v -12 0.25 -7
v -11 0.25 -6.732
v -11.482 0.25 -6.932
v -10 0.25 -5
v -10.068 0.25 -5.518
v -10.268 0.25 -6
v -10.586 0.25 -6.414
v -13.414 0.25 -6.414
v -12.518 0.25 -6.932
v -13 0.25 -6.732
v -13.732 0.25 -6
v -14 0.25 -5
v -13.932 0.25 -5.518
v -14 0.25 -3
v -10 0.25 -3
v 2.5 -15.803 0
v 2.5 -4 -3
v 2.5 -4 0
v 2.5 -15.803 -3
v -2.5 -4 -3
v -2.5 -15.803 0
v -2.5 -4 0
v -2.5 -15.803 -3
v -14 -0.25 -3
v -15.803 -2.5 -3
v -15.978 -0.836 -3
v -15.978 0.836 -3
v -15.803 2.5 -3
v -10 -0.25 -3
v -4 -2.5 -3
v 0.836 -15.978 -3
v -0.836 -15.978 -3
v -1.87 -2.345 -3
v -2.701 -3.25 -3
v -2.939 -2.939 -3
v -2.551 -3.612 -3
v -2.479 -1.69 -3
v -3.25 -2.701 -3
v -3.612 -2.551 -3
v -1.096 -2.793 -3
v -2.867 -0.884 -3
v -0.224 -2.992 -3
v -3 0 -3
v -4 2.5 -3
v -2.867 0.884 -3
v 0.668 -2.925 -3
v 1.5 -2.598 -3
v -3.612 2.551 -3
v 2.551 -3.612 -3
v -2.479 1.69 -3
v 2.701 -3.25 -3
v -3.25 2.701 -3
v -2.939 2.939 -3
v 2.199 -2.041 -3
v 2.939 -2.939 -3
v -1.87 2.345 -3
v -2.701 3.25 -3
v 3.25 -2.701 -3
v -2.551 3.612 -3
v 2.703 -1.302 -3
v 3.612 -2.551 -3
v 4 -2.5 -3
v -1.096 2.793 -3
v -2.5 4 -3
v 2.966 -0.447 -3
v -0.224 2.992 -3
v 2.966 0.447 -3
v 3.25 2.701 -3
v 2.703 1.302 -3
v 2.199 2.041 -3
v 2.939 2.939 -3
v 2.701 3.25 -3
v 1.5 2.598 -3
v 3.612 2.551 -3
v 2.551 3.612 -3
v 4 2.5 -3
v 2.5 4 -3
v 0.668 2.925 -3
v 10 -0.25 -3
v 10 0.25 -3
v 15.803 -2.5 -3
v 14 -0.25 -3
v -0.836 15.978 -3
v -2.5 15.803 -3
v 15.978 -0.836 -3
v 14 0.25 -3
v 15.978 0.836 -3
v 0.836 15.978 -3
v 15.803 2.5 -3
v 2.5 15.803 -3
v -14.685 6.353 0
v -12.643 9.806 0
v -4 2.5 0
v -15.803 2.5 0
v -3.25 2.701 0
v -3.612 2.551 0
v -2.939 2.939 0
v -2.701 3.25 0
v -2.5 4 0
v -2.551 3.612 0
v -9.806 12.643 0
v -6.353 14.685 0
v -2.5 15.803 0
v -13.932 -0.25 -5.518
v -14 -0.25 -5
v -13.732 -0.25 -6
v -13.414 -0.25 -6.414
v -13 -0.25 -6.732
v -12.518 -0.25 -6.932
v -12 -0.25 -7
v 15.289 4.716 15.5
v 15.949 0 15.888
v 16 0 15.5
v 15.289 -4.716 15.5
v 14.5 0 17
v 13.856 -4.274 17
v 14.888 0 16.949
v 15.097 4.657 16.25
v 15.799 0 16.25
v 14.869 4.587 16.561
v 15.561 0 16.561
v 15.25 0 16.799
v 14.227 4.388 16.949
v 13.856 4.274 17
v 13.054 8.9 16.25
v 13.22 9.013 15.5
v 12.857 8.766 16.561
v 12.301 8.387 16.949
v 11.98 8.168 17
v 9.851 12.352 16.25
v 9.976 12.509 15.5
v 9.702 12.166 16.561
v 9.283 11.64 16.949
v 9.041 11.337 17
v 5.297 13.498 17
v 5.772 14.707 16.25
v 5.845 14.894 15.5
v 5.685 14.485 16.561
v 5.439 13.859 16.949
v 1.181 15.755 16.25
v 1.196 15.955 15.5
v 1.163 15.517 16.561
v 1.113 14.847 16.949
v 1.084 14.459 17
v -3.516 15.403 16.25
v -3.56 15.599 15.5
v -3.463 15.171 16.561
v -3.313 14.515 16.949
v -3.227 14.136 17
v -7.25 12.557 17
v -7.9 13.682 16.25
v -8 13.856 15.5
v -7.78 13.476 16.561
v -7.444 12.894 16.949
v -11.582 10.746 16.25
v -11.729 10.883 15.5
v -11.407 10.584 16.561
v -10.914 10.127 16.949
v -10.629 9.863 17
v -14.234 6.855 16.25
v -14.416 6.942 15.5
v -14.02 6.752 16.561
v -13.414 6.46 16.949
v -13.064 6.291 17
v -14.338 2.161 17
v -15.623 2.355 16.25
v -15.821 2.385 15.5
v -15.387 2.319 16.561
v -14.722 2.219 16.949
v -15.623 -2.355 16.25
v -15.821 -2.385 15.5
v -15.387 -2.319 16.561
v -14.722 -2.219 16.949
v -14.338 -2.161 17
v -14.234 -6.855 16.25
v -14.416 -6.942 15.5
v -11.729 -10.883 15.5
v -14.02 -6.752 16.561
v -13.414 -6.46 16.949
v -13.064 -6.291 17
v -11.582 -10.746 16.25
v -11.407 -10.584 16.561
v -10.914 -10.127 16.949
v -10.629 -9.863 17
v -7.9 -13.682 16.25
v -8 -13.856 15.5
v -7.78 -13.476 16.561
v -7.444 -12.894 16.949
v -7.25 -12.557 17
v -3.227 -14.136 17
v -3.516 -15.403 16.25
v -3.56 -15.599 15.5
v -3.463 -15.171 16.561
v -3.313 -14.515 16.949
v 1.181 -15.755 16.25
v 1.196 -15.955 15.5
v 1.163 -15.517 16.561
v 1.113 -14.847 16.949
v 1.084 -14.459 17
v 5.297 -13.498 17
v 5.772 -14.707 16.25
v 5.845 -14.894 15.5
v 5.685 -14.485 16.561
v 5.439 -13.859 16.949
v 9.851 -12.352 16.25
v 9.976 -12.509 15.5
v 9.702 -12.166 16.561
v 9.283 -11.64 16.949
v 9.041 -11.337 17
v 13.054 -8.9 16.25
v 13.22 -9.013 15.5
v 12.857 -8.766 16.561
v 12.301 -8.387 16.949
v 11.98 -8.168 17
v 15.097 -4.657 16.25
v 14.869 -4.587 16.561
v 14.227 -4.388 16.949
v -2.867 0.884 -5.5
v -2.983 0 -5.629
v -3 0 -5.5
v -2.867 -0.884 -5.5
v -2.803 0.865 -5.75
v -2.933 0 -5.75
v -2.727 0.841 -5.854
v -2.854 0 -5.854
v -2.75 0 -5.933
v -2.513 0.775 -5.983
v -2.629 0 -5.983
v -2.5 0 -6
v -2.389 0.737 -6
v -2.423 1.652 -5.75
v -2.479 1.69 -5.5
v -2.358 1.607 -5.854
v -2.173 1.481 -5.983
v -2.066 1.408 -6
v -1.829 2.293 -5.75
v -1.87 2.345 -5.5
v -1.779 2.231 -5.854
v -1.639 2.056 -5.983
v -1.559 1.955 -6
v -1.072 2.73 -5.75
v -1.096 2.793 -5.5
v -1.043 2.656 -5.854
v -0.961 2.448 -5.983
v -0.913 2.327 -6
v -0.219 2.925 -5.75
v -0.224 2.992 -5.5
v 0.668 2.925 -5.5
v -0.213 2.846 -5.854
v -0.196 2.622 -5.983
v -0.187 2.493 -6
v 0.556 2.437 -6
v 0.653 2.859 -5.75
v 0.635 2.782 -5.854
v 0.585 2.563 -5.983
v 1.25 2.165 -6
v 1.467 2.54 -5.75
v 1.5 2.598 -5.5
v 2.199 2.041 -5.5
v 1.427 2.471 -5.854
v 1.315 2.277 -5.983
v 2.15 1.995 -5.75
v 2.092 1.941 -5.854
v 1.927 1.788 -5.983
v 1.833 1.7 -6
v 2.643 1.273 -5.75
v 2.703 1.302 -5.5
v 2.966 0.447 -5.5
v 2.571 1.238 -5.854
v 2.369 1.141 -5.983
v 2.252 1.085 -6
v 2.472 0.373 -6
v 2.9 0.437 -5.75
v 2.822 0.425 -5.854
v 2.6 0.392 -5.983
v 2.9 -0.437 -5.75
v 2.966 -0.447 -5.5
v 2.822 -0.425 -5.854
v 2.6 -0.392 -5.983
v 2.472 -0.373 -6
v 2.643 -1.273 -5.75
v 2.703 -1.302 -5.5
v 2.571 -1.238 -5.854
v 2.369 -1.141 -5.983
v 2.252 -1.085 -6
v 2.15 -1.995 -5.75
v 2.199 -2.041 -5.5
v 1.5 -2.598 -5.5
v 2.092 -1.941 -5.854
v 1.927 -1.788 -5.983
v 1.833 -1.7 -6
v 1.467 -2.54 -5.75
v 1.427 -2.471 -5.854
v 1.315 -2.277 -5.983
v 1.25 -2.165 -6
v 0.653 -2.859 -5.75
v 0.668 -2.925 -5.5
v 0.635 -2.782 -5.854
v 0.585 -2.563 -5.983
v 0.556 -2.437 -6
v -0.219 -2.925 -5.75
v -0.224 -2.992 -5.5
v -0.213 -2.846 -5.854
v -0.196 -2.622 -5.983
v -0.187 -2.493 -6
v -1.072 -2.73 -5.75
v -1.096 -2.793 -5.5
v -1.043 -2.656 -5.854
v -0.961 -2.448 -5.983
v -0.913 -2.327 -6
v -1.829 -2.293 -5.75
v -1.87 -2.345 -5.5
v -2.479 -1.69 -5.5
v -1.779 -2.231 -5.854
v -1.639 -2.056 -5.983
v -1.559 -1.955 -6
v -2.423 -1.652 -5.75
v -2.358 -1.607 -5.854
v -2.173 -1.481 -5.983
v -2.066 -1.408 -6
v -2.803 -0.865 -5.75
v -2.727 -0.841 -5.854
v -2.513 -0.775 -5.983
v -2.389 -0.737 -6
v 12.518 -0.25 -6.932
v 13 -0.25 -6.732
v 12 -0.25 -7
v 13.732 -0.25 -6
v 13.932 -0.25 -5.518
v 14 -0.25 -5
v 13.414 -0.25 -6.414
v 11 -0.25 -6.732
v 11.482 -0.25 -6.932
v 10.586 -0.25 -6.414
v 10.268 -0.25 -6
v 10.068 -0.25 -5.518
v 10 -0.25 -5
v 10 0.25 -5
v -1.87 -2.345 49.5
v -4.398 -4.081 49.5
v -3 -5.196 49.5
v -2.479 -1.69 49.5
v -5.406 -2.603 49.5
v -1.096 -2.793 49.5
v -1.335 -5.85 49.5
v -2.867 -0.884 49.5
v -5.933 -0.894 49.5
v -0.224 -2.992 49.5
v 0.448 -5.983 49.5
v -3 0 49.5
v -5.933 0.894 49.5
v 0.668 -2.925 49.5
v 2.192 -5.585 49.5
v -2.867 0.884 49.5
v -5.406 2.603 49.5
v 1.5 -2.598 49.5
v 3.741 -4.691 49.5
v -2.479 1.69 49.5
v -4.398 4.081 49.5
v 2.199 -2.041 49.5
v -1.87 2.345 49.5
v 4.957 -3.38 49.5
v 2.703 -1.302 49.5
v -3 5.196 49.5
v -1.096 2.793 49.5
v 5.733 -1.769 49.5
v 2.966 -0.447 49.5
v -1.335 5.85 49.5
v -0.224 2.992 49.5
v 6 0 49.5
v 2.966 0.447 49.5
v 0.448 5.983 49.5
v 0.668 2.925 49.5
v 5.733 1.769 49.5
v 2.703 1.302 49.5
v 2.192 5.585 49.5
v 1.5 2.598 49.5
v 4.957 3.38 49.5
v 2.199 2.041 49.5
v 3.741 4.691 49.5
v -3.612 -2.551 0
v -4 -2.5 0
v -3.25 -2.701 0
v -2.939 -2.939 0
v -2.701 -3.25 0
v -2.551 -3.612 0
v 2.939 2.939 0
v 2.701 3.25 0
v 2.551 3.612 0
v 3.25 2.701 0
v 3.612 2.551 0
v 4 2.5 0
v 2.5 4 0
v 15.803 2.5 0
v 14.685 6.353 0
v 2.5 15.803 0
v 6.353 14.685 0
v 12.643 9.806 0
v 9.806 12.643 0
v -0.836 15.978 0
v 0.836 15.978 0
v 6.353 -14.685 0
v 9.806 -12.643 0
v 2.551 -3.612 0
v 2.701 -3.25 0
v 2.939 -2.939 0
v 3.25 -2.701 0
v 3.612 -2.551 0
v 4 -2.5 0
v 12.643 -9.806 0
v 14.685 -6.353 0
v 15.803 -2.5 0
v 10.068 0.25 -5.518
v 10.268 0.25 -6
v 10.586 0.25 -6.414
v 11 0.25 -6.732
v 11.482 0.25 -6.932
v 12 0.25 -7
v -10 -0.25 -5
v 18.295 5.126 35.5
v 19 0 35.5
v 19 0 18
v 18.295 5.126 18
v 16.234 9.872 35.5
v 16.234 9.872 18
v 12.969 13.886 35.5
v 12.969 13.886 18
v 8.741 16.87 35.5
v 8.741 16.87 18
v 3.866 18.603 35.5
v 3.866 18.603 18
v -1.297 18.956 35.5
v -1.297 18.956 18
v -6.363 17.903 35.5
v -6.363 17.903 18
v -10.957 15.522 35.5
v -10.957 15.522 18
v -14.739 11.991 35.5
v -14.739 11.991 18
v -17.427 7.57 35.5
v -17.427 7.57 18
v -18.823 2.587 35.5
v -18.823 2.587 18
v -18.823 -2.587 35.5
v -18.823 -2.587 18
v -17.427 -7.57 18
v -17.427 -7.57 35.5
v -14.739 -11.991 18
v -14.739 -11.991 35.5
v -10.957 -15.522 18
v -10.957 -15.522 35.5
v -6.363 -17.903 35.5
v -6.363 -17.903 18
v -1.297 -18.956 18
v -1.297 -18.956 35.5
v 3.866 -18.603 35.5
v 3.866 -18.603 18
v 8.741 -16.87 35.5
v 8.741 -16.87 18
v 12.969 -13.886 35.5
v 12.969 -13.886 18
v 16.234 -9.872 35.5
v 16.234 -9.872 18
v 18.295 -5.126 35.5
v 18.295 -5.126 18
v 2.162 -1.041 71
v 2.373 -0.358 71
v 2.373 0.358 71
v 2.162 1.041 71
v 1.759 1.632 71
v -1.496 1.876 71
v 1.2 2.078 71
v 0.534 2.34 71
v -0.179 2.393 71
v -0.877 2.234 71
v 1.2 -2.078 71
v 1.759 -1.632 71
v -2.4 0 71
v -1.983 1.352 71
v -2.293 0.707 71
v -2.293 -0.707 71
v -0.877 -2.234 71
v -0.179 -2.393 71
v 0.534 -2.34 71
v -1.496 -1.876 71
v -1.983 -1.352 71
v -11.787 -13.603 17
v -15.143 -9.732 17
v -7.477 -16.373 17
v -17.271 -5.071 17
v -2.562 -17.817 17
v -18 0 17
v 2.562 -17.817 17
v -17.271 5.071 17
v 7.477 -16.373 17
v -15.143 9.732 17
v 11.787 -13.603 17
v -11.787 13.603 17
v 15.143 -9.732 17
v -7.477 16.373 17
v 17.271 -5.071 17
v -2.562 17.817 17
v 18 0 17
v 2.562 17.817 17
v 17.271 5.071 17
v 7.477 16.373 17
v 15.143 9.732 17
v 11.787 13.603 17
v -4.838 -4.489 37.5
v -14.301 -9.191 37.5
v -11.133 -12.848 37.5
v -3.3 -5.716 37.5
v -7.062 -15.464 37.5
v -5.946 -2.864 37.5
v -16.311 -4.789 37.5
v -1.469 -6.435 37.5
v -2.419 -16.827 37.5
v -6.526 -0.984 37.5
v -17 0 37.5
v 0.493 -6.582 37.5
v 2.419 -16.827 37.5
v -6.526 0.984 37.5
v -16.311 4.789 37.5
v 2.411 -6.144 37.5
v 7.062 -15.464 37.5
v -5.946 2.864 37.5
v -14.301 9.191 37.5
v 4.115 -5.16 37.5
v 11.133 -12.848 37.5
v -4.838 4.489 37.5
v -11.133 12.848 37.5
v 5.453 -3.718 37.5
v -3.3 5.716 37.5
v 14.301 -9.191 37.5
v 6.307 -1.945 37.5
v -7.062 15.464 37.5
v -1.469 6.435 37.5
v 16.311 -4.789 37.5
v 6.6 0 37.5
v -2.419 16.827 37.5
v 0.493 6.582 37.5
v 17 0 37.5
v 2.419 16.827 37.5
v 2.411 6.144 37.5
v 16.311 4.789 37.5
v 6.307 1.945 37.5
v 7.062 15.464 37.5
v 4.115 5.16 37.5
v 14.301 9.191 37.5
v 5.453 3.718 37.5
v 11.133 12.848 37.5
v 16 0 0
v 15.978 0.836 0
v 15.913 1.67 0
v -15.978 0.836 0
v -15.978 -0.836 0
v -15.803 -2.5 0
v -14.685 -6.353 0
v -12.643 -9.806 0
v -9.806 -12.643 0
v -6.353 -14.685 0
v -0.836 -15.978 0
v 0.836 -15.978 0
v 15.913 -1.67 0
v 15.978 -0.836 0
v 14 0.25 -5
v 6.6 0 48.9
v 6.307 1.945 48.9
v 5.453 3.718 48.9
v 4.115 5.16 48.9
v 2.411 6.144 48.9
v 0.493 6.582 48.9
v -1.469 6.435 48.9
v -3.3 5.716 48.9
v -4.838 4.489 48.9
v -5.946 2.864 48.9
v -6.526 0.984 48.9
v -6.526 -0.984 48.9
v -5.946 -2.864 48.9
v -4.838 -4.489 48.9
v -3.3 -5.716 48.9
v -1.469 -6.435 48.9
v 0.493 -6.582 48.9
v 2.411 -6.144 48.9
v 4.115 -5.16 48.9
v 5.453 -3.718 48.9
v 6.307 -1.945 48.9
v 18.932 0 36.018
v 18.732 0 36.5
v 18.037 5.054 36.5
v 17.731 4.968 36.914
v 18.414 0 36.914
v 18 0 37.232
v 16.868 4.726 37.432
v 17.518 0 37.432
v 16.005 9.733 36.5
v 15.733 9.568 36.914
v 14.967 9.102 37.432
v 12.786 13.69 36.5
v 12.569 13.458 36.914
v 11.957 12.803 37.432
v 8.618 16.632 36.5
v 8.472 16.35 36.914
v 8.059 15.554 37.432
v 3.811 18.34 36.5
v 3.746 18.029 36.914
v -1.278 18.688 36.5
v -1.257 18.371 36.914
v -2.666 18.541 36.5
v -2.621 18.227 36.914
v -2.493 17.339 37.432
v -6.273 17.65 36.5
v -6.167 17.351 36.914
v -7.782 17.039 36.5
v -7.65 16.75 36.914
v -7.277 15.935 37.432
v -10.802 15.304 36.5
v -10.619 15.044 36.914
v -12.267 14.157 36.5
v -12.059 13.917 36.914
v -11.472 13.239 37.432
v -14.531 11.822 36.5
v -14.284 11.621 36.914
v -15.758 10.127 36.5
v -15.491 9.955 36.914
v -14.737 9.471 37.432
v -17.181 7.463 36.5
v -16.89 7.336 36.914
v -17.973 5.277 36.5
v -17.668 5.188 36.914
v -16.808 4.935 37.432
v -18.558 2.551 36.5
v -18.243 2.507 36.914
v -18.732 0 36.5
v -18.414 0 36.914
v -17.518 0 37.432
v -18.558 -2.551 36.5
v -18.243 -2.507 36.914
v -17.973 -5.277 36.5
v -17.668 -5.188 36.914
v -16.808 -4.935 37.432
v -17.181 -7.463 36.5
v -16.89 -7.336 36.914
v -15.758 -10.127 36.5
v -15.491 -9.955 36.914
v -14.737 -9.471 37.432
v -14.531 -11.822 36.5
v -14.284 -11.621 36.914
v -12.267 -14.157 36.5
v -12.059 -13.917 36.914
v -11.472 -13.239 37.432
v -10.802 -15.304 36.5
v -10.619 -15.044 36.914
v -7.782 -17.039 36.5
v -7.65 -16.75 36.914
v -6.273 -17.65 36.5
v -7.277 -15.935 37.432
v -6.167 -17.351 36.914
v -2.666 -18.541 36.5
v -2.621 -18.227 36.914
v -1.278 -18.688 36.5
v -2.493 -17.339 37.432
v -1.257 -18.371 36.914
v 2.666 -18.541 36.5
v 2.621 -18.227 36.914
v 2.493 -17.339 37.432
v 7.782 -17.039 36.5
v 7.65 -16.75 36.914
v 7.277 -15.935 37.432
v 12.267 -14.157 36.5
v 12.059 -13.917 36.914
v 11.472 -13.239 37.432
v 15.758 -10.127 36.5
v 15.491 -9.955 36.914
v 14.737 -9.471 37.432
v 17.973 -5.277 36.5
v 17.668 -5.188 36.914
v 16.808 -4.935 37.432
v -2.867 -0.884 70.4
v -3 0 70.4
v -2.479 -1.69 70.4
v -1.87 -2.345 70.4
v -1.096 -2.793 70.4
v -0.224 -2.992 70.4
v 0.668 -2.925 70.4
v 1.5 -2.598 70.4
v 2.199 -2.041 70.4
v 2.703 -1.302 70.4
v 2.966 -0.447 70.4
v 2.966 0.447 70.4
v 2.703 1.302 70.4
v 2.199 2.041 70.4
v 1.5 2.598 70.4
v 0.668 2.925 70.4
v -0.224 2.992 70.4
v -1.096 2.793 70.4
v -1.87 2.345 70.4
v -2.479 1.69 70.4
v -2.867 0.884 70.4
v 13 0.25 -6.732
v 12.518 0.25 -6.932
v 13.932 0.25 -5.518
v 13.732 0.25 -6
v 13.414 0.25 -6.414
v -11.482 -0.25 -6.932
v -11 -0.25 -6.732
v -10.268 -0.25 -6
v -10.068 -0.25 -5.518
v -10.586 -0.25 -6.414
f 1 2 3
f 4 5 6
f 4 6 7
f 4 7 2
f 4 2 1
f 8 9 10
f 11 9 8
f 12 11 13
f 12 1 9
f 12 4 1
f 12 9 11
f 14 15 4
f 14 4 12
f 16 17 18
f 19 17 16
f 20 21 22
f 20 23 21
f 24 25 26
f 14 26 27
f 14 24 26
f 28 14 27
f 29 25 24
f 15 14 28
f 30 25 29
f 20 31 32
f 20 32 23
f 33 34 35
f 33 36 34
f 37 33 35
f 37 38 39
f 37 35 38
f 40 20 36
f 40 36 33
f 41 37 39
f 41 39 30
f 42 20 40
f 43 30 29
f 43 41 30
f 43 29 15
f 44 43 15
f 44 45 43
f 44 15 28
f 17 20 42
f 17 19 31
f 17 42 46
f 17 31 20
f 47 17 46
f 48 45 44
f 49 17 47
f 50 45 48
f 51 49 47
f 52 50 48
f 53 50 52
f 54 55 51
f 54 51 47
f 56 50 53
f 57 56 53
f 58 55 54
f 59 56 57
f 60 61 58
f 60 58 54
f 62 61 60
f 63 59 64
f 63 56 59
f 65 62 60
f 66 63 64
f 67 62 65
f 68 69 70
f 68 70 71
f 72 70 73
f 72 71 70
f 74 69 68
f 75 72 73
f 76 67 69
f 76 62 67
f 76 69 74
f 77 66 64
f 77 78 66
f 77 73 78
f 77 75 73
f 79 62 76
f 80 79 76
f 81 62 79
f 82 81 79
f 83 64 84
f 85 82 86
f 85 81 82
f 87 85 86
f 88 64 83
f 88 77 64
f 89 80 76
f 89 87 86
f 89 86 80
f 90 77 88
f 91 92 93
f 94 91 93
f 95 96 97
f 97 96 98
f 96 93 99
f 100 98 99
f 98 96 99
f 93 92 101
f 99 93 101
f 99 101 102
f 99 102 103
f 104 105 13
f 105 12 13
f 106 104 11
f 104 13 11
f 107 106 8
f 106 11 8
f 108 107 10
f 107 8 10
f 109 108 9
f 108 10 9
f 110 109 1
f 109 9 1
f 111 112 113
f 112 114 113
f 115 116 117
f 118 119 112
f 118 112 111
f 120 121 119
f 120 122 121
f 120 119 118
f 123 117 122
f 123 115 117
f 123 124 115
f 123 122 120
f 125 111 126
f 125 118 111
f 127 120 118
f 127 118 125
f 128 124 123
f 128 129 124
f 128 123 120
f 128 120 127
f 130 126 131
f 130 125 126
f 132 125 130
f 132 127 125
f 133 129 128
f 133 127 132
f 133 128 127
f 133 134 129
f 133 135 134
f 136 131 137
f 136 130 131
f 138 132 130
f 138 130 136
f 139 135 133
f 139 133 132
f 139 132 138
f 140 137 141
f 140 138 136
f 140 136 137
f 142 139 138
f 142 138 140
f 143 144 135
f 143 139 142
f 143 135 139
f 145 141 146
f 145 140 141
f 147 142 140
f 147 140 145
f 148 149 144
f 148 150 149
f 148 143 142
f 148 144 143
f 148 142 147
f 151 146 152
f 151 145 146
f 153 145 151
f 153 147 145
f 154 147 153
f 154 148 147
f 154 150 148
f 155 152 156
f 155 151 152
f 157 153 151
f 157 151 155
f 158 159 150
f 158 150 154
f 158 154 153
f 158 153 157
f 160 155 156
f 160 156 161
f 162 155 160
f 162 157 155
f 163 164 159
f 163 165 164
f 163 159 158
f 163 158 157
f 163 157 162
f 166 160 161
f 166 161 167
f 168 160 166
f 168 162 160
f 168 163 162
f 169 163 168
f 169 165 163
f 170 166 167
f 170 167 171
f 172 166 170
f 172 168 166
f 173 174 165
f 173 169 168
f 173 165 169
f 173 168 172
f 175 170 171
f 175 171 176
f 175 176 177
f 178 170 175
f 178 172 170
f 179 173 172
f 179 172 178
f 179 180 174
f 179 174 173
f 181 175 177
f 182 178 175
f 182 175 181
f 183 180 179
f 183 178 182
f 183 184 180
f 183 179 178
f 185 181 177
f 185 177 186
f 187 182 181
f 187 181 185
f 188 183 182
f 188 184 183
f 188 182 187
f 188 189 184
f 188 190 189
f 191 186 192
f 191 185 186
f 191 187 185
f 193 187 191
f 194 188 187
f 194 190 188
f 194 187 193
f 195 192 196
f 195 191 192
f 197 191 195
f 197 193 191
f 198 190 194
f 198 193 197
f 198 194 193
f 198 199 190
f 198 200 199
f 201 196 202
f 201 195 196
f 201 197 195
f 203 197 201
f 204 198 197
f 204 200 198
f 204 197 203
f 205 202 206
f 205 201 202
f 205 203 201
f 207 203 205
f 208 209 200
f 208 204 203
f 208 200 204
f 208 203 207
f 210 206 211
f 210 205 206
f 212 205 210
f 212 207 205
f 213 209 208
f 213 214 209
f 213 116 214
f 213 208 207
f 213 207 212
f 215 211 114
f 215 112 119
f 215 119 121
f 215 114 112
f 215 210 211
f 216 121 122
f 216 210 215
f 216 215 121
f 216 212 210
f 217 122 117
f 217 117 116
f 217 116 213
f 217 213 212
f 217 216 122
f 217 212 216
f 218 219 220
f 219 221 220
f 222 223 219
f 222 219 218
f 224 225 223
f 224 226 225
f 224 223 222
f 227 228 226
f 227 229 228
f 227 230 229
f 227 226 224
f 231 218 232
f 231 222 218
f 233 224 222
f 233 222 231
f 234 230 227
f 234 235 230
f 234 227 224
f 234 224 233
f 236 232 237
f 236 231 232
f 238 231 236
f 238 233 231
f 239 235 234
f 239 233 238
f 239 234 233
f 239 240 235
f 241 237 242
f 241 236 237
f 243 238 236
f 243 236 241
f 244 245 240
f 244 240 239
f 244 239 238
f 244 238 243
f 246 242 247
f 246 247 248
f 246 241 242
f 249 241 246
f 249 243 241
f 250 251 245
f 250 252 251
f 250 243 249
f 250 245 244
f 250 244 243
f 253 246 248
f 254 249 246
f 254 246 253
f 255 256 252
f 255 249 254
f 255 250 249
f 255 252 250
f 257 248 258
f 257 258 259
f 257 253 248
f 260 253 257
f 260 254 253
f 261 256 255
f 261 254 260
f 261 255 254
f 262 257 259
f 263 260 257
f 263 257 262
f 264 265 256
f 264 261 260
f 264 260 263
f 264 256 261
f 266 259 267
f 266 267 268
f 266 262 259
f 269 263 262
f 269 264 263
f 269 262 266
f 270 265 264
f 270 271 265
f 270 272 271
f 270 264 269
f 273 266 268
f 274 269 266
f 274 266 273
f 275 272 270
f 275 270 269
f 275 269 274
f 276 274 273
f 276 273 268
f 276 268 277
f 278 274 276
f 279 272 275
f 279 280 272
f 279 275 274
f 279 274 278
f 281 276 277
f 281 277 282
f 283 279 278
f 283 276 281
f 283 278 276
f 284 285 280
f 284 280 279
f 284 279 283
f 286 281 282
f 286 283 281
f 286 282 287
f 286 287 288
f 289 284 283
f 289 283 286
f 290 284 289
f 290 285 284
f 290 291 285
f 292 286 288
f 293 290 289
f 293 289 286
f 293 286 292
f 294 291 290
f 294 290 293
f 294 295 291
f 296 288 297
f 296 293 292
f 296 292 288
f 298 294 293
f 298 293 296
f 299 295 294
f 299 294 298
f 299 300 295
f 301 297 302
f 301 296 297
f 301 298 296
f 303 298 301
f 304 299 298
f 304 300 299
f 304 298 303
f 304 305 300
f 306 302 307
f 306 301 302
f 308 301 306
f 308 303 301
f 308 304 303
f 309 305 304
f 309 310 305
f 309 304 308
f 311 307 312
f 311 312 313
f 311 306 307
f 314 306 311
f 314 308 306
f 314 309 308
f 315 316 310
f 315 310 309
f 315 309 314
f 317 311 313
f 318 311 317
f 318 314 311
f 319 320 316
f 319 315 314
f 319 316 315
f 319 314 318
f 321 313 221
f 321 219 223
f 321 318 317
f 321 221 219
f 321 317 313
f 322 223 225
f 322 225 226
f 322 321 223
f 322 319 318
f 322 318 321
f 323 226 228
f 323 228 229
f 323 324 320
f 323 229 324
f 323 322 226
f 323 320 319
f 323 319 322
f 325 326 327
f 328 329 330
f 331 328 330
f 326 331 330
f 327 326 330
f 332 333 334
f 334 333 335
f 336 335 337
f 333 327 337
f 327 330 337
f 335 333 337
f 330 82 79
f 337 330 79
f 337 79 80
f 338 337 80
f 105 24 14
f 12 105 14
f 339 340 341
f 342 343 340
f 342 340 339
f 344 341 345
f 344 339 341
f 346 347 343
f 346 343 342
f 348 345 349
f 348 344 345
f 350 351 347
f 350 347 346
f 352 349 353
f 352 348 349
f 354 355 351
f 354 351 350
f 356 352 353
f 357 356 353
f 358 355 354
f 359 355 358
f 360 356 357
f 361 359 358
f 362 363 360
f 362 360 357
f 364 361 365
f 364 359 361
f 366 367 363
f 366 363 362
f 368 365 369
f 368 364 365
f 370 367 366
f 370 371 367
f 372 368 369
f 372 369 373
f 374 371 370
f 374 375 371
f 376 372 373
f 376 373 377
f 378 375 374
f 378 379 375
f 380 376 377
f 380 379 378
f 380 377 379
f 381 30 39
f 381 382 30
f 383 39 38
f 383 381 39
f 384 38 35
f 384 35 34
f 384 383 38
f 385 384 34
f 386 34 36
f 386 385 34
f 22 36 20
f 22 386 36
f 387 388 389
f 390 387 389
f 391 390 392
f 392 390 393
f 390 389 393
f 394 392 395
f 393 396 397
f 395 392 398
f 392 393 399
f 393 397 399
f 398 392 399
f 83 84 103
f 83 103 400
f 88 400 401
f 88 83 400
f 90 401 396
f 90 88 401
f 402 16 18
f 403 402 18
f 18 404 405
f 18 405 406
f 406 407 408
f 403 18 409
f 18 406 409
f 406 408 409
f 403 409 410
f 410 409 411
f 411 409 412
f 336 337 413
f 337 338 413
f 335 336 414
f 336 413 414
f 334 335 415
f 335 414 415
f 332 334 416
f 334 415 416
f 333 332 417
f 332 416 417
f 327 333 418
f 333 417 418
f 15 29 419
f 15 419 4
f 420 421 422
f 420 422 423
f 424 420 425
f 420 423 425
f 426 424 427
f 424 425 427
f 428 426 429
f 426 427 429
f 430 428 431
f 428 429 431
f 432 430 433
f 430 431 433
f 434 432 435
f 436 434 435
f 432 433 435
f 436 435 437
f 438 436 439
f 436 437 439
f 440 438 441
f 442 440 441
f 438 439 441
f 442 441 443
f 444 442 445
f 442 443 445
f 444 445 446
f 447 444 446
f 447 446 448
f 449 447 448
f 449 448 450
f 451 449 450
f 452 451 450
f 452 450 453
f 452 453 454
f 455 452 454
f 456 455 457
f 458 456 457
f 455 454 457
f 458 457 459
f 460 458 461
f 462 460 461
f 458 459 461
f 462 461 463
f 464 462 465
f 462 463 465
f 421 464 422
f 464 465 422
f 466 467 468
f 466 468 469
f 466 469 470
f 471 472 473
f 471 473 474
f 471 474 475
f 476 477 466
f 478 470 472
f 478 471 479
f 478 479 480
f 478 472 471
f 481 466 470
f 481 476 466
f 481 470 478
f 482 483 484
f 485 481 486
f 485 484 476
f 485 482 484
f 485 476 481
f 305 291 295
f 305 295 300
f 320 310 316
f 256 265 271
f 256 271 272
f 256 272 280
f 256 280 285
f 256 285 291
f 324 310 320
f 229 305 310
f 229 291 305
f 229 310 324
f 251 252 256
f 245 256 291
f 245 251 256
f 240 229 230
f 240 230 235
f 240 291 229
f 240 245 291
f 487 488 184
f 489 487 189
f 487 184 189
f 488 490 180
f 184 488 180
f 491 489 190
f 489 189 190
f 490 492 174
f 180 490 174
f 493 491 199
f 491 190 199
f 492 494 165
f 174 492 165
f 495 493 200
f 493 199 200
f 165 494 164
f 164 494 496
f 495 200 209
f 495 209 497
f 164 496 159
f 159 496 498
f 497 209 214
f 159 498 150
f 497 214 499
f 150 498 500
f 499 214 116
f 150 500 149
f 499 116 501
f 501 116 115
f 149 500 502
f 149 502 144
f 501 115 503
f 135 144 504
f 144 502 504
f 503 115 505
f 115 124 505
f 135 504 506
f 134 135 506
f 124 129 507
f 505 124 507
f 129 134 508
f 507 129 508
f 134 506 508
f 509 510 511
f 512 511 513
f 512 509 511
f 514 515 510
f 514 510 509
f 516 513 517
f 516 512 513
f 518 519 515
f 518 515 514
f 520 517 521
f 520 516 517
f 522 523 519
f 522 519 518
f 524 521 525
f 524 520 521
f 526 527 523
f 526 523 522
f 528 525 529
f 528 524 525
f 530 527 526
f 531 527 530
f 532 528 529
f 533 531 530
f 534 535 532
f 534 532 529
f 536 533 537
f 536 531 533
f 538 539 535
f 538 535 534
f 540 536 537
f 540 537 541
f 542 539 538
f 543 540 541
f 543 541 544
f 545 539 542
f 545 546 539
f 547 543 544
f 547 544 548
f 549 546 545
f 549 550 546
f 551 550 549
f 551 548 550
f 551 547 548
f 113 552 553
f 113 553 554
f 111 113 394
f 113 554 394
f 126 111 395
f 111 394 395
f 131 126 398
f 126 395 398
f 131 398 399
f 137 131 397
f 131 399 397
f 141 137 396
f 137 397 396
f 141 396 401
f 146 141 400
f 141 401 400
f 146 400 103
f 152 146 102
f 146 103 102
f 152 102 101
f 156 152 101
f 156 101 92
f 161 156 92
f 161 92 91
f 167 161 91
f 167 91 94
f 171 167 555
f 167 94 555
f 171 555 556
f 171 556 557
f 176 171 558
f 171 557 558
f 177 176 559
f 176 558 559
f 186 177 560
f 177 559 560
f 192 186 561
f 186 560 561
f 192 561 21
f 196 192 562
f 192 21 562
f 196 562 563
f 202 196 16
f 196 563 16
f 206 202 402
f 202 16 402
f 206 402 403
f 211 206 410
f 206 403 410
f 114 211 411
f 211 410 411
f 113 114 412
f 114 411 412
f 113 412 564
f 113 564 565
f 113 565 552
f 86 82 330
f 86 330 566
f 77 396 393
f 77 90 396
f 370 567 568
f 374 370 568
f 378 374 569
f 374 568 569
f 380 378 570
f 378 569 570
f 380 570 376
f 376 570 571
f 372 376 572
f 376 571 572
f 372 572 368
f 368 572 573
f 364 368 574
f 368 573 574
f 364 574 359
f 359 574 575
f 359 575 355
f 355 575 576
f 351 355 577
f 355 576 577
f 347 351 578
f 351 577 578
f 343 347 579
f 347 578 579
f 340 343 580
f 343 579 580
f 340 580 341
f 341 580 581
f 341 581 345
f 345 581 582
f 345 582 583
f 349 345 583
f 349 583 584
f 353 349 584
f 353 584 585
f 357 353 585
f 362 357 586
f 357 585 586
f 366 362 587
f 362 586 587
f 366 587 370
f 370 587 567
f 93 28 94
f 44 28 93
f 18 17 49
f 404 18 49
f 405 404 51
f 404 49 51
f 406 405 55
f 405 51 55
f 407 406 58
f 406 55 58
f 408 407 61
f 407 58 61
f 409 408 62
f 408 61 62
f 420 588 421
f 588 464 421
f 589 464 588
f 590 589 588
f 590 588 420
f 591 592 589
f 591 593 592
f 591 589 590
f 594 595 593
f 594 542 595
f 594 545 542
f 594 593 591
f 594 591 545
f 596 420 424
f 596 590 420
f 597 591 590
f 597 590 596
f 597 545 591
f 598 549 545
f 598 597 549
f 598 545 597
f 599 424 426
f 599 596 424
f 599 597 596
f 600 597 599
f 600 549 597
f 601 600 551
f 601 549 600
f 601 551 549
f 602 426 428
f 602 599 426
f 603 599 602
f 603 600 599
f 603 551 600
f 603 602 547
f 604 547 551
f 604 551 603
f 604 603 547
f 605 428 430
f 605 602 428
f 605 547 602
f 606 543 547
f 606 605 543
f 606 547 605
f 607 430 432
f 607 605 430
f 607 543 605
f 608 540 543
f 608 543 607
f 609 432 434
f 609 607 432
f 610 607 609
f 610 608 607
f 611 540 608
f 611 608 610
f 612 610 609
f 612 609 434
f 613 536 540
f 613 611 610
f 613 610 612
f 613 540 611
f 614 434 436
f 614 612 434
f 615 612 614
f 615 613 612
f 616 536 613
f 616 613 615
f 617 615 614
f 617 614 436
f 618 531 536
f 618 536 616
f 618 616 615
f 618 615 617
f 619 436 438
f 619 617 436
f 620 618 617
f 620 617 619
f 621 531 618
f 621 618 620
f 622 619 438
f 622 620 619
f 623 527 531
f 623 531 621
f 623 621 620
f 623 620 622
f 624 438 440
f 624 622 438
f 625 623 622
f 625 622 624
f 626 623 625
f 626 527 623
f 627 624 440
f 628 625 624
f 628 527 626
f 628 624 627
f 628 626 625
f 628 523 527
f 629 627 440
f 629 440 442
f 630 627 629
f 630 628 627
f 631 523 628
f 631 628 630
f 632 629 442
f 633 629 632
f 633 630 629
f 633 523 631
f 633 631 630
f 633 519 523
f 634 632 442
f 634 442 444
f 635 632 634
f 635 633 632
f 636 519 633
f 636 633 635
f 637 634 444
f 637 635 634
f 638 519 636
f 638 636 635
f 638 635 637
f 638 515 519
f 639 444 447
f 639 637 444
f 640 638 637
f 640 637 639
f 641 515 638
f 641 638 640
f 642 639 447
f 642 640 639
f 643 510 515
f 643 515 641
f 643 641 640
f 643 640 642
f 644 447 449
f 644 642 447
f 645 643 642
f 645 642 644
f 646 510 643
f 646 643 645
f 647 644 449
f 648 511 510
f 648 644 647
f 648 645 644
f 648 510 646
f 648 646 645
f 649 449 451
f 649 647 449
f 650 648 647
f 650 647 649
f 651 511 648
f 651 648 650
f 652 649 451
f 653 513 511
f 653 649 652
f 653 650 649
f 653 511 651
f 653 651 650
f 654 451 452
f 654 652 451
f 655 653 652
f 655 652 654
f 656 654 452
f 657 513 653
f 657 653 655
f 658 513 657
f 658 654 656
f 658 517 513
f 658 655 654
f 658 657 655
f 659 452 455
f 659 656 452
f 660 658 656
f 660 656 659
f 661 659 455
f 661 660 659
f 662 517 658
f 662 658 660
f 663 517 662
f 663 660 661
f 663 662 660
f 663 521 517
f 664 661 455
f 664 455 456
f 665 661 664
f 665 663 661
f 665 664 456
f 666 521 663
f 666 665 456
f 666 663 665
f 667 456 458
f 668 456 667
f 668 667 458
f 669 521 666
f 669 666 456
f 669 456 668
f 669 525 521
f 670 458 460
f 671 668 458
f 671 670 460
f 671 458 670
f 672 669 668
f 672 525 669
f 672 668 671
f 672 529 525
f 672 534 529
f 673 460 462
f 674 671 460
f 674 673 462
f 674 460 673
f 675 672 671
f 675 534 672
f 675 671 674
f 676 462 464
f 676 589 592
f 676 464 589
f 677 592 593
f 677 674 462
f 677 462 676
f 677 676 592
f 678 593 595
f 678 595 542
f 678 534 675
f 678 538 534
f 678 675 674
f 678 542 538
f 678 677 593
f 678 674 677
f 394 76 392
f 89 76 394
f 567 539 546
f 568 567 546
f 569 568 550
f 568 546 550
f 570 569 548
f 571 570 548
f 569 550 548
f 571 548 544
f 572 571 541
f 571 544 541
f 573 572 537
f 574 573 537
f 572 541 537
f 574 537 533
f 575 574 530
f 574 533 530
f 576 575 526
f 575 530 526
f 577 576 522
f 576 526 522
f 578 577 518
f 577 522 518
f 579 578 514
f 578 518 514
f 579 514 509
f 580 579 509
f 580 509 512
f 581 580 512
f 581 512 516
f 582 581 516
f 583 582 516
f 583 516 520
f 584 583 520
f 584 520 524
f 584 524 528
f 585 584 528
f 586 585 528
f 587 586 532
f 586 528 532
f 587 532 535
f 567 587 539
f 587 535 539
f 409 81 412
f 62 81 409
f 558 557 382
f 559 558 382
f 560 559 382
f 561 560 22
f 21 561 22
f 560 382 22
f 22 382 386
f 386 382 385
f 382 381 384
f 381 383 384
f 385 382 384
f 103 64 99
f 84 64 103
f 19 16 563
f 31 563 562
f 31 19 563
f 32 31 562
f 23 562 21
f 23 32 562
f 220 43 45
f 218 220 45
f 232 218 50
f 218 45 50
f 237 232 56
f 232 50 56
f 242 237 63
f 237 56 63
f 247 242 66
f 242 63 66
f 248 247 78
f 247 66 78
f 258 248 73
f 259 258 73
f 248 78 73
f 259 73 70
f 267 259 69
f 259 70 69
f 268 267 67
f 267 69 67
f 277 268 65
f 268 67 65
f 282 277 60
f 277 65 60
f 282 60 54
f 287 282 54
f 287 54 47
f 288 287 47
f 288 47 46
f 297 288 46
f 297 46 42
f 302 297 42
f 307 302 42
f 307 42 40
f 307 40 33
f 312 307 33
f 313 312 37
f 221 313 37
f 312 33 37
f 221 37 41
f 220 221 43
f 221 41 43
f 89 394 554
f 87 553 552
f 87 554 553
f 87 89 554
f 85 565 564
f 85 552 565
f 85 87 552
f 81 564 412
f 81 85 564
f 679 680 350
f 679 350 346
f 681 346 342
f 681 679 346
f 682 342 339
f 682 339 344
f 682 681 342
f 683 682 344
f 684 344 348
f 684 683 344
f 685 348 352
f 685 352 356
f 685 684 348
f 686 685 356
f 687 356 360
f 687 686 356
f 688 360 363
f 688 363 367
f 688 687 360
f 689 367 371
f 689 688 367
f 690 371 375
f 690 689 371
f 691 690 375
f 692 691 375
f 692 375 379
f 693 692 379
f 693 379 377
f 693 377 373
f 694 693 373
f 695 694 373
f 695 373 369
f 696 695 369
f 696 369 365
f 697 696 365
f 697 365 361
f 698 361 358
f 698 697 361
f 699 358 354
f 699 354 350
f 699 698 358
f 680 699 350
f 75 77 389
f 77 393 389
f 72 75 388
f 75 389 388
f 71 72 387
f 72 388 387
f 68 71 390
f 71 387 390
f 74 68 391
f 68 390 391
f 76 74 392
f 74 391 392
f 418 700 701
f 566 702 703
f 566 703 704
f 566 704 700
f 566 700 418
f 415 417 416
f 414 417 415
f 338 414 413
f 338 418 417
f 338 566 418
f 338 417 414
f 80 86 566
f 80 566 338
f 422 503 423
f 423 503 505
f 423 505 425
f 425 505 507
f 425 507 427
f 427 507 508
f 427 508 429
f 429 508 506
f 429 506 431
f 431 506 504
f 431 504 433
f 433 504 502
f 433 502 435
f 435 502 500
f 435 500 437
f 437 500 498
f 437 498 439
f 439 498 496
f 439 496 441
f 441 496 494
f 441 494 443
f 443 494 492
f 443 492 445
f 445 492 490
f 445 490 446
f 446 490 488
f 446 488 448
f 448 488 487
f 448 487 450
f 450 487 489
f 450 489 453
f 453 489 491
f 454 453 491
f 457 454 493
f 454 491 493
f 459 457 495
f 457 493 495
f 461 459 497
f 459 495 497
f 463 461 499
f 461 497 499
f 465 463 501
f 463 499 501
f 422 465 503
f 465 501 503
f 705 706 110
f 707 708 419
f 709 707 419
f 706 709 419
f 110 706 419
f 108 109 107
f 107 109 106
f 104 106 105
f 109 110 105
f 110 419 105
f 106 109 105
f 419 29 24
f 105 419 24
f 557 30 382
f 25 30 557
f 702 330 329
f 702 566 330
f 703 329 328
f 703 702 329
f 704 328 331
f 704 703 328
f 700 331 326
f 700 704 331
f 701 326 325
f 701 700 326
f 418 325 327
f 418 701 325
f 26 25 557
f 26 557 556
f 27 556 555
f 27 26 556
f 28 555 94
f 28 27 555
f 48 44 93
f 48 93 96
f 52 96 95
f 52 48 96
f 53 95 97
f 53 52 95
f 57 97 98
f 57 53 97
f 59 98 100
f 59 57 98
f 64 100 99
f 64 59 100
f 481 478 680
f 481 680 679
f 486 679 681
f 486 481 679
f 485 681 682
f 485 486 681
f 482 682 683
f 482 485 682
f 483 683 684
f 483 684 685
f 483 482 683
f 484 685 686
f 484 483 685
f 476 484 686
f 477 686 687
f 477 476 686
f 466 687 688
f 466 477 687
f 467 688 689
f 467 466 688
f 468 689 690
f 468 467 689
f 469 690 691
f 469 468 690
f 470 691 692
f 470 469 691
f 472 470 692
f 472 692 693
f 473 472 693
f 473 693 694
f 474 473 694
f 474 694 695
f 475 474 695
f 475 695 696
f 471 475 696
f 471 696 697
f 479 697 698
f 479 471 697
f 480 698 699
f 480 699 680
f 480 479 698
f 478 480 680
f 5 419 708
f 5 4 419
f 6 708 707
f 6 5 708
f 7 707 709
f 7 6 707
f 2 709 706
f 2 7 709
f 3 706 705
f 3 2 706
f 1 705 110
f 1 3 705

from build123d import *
from build123d.topology import SkipClean

# Parameters (mm, degrees)
SKETCH1_R           = 16
BOSS_EXTRUDE1_DEPTH = 17
FILLET1_R           = 1.5
BOSS_EXTRUDE2_START = 3
BOSS_EXTRUDE2_DEPTH = 3
CIRPATTERN1_COUNT   = 4
FILLET2_R           = 1.5
SKETCH5_R           = 3
BOSS_EXTRUDE3_DEPTH = 3
FILLET3_R           = 0.5
SKETCH6_R           = 19
BOSS_EXTRUDE4_DEPTH = 20.5
CHAMFER1_SIZE       = 1
SKETCH7_W           = 4
SKETCH7_H           = 0.5
BOSS_EXTRUDE5_DEPTH = 4
FILLET4_R           = 2
FILLET5_R           = 2
SKETCH8_R           = 6.6
BOSS_EXTRUDE6_DEPTH = 12
BOSS_EXTRUDE7_START = 21.5
SKETCH9_R           = 3
BOSS_EXTRUDE7_DEPTH = 21.5
CHAMFER2_SIZE       = 0.6
CHAMFER3_SIZE       = 0.6


with BuildPart() as part:
    # Sketch1 → Boss-Extrude1 (new body)
    with BuildSketch(Plane.XY):
        Circle(SKETCH1_R)
    extrude(amount=BOSS_EXTRUDE1_DEPTH)

    # Fillet1
    fillet1_edges = [part.edges().sort_by_distance(p)[0] for p in [
        (-16, 0, 17),
    ]]
    fillet(fillet1_edges, radius=FILLET1_R)

    # Sketch3 → Boss-Extrude2 (add)
    with SkipClean():  # the faces are left unmerged after this step: merging them gives an invalid solid
        with BuildSketch(Plane(origin=(0, 0, 0), x_dir=(-1, 0, 0), z_dir=(0, 0, -1)).offset(BOSS_EXTRUDE2_START)):
            with BuildLine():
                Line((-2.5, 15.803481), (-2.5, -15.803481))
                ThreePointArc((-2.5, -15.803481), (0, -16), (2.5, -15.803481))
                Line((2.5, -15.803481), (2.5, 15.803481))
                ThreePointArc((2.5, 15.803481), (0, 16), (-2.5, 15.803481))
            make_face()
        boss_extrude2 = extrude(amount=-BOSS_EXTRUDE2_DEPTH)

    # CirPattern1: Boss-Extrude2 ×4 about axis
    with SkipClean():  # the faces are left unmerged after this step: merging them gives an invalid solid
        cirpattern1_axis = Axis((0, 0, 0), (0, 0, -1))
        for i in range(1, CIRPATTERN1_COUNT):
            add(boss_extrude2.rotate(cirpattern1_axis, i * 360 / CIRPATTERN1_COUNT))

    # Fillet2
    fillet2_edges = [part.edges().sort_by_distance(p)[0] for p in [
        (-2.5, 2.5, -1.5),
        (2.5, 2.5, -1.5),
        (-2.5, -2.5, -1.5),
        (2.5, -2.5, -1.5),
    ]]
    fillet(fillet2_edges, radius=FILLET2_R)

    # Sketch5 → Boss-Extrude3 (add)
    with SkipClean():  # the faces are left unmerged after this step: merging them gives an invalid solid
        with BuildSketch(Plane(origin=(0, 0, -3), x_dir=(-1, 0, 0), z_dir=(0, 0, -1))):
            Circle(SKETCH5_R)
        extrude(amount=BOSS_EXTRUDE3_DEPTH)

    # Fillet3
    fillet3_edges = [part.edges().sort_by_distance(p)[0] for p in [
        (3, 0, -6),
    ]]
    fillet(fillet3_edges, radius=FILLET3_R)

    # Sketch6 → Boss-Extrude4 (add)
    with SkipClean():  # the faces are left unmerged after this step: merging them gives an invalid solid
        with BuildSketch(Plane.XY.offset(17)):
            Circle(SKETCH6_R)
        extrude(amount=BOSS_EXTRUDE4_DEPTH)

    # Chamfer1
    chamfer1_edges = [part.edges().sort_by_distance(p)[0] for p in [
        (-19, 0, 17),
    ]]
    chamfer(chamfer1_edges, length=CHAMFER1_SIZE)

    # Sketch7 → Boss-Extrude5 (add)
    with SkipClean():  # the faces are left unmerged after this step: merging them gives an invalid solid
        with BuildSketch(Plane(origin=(0, 0, -3), x_dir=(-1, 0, 0), z_dir=(0, 0, -1))):
            with Locations((12, 0)):
                Rectangle(SKETCH7_W, SKETCH7_H)
            with Locations((-12, 0)):
                Rectangle(SKETCH7_W, SKETCH7_H)
        extrude(amount=BOSS_EXTRUDE5_DEPTH)

    # Fillet4
    fillet4_edges = [part.edges().sort_by_distance(p)[0] for p in [
        (14, 0, -7),
        (10, 0, -7),
        (-10, 0, -7),
        (-14, 0, -7),
    ]]
    fillet(fillet4_edges, radius=FILLET4_R - 0.0001)  # a hair under: the kernel refuses the full size

    # Fillet5
    fillet5_edges = [part.edges().sort_by_distance(p)[0] for p in [
        (-19, 0, 37.5),
    ]]
    fillet(fillet5_edges, radius=FILLET5_R)

    # Sketch8 → Boss-Extrude6 (add)
    with BuildSketch(Plane.XY.offset(37.5)):
        Circle(SKETCH8_R)
    extrude(amount=BOSS_EXTRUDE6_DEPTH)

    # Sketch9 → Boss-Extrude7 (add)
    with BuildSketch(Plane.XY.offset(49.5).offset(BOSS_EXTRUDE7_START)):
        with Locations(Location((0, 0, 0), (0, 0, 180))):
            Circle(SKETCH9_R)
    extrude(amount=-BOSS_EXTRUDE7_DEPTH)

    # Chamfer2
    chamfer2_edges = [part.edges().sort_by_distance(p)[0] for p in [
        (3, 0, 71),
    ]]
    chamfer(chamfer2_edges, length=CHAMFER2_SIZE)

    # Chamfer3
    chamfer3_edges = [part.edges().sort_by_distance(p)[0] for p in [
        (-6.6, 0, 49.5),
    ]]
    chamfer(chamfer3_edges, length=CHAMFER3_SIZE)


solid = part.part
